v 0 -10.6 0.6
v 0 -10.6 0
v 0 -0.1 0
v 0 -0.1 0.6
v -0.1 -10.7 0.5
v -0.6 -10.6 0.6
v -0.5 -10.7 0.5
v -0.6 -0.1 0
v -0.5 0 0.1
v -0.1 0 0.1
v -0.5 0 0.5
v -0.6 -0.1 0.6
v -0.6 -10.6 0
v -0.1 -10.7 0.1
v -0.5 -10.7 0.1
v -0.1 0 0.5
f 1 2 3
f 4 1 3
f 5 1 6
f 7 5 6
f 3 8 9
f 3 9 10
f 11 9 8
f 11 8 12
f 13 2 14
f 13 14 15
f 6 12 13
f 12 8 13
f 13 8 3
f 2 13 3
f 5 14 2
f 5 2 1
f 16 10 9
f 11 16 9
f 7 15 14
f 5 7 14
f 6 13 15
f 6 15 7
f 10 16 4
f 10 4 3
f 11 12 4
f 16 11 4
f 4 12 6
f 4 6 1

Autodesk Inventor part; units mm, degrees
ref_plane "YZ Plane" through (0, 0, 0) normal (1, 0, 0) x (0, 1, 0)
ref_plane "XZ Plane" through (0, 0, 0) normal (0, 1, 0) x (-1, 0, 0)
ref_plane "XY Plane" through (0, 0, 0) normal (0, 0, 1) x (1, 0, 0)
sketch "Skizze1" plane through (0, 0, 0) normal (0, 0, 1) x (1, 0, 0)
  line L0 (0, 0) -> (-0.6, 0)
  line L1 (-0.6, 0) -> (-0.6, -10.7)
  line L2 (-0.6, -10.7) -> (0, -10.7)
  line L3 (0, -10.7) -> (0, 0)
  dimension "d0" = 0.6
  dimension "d1" = 10.7
extrude "Grobblech1" add sketch "Skizze1" along normal blind 0.6
chamfer "Fase1" distance 0.1 angle 45 8 edges at (-0.6, -10.7, 0.3) (-0.3, -10.7, 0) (0, -10.7, 0.3) (-0.3, -10.7, 0.6) (-0.3, 0, 0) (-0.6, 0, 0.3) (-0.3, 0, 0.6) (0, 0, 0.3)
sketch "Skizze2" plane through (-0.5, -10.7, 0.1) normal (0, -1, 0) x (1, 0, 0)
  line L0 (0.4, 0) -> (0, 0) projected
  line L1 (0.4, 0.4) -> (0.4, 0) projected
  line L2 (0, 0.4) -> (0.4, 0.4) projected
  line L3 (0, 0) -> (0, 0.4) projected
  point P0 (0.5, -0.1)
  point P1 (0.2, 0.2)
  point P2 (0, 0.2)
  point P3 (0.2, 0.4)
sketch "Skizze3" plane through (-0.5, 0, 0.1) normal (0, 1, 0) x (1, 0, 0)
  line L0 (0, 0) -> (0.4, 0) construction
  line L1 (0, -0.4) -> (0, 0) construction
  line L2 (0.4, -0.4) -> (0, -0.4) construction
  line L3 (0.4, 0) -> (0.4, -0.4) construction
  point P0 (0.5, 0.1)
  point P1 (0.2, -0.2)
  point P2 (0, -0.2)
  point P3 (0.2, -0.4)
equation "\"d2\" = Stärke"
equation "\"Biegeradius\" = Stärke"
equation "\"BreiteBiegungsfreistellung\" = Stärke"
equation "\"TiefeBiegungsfreistellung\" = 0.5 * Stärke"
equation "\"GrößeEckenfreistellung\" = 4 * Stärke"
equation "\"MinimalRest\" = 2 * Stärke"
equation "\"Übergangsradius\" = Biegeradius"
equation "\"JacobiRadiusGröße\" = Biegeradius"
equation "\"Abstandsgröße\" = Stärke"
equation "\"Stärke\" = 0.6"
properties part number "Pins" material "Aluminium 6061"
